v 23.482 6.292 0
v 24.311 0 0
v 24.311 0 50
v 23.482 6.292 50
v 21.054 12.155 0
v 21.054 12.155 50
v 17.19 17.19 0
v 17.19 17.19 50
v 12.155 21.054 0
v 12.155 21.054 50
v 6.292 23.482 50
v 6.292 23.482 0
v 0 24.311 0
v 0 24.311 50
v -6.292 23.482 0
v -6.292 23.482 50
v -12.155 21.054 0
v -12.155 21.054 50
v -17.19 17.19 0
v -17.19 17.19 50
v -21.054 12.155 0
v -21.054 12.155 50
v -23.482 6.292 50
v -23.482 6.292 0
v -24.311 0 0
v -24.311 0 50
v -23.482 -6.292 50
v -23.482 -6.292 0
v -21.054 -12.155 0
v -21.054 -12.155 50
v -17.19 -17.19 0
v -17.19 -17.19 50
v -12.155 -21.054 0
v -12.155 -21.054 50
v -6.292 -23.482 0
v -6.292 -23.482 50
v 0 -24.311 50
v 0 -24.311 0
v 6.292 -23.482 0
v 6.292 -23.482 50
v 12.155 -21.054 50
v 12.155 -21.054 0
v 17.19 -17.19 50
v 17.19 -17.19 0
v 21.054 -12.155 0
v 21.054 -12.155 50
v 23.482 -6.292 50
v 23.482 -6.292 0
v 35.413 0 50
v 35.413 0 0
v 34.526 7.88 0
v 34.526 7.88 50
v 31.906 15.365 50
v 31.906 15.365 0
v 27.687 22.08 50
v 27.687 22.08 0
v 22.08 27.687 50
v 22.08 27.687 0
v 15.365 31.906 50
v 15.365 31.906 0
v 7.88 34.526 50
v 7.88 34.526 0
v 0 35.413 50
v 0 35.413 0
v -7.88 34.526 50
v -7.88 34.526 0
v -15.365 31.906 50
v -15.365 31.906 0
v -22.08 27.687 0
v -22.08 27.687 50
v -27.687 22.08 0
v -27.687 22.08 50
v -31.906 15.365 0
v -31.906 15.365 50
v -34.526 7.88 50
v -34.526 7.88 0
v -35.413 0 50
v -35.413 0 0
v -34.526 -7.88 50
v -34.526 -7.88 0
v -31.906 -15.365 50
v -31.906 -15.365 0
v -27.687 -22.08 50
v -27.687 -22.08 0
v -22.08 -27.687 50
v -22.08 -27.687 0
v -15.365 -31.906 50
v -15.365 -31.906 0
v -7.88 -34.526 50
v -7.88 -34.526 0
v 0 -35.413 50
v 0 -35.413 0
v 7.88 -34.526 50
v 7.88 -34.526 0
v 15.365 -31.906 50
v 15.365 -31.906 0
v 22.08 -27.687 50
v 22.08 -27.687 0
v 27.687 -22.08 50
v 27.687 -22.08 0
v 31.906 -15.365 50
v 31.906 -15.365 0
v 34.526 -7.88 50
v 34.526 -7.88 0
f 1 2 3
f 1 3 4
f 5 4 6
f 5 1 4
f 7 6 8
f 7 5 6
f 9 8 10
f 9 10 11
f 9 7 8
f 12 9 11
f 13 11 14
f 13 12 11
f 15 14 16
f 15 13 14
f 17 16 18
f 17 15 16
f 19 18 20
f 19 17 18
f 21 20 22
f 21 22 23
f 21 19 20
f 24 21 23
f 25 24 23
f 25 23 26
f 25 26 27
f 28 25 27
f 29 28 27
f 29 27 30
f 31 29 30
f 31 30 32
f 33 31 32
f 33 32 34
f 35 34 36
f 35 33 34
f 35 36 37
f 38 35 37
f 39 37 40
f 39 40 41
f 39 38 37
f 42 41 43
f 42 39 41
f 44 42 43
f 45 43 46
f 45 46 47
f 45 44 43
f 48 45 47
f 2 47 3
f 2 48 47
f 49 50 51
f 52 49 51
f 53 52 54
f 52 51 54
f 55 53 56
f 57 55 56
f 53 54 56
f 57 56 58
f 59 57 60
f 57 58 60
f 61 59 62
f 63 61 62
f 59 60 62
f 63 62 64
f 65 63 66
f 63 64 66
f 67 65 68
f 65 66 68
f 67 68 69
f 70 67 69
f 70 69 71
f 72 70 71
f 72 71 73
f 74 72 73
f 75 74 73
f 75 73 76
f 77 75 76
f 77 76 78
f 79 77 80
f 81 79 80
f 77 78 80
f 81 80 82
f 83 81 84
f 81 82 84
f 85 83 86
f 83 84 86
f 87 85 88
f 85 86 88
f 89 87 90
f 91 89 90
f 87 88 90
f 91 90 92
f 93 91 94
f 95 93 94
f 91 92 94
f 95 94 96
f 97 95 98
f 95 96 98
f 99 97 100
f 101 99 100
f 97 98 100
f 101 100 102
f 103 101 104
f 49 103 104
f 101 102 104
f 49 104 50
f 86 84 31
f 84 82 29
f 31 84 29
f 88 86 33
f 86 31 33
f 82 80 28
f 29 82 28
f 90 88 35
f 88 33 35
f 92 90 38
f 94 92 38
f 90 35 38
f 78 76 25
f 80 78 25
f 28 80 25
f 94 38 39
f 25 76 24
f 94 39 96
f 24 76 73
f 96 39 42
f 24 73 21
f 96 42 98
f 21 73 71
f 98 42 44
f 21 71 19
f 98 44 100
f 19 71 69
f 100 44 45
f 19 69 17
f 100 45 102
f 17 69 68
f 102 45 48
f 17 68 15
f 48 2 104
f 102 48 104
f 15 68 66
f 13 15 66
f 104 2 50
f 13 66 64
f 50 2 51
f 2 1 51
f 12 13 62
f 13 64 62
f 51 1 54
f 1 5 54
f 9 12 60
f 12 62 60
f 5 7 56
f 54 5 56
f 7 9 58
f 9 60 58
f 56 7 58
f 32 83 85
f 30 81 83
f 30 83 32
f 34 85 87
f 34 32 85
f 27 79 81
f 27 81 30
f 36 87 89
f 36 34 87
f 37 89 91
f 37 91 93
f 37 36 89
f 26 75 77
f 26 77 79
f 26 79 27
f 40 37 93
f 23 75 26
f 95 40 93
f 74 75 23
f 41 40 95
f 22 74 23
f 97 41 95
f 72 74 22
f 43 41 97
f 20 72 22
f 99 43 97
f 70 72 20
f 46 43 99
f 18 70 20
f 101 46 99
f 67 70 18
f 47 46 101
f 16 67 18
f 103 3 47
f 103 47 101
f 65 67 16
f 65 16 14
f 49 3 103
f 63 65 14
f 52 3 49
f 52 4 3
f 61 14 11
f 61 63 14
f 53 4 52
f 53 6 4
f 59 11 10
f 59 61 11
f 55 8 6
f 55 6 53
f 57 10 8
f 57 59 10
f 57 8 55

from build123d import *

# Parameters (mm, degrees)
F0_R     = 35.413453
F1_DEPTH = 50
F2_R     = 30.967597
F3_DEPTH = 50
F4_R     = 30.405433
F5_DEPTH = 50
F6_R     = 24.310595
F7_DEPTH = 50


with BuildPart() as f1:
    # F0 (on Top) → F1 (new body)
    with BuildSketch(Plane.XY):
        Circle(F0_R)
    extrude(amount=F1_DEPTH)

    # F2 (on Top) → F3 (cut)
    with BuildSketch(Plane.XY):
        Circle(F2_R)
    extrude(amount=-F3_DEPTH, mode=Mode.SUBTRACT)

    # F4 (on Top) → F5 (cut)
    with BuildSketch(Plane.XY):
        Circle(F4_R)
    extrude(amount=-F5_DEPTH, mode=Mode.SUBTRACT)

    # F6 (on Top) → F7 (cut)
    with BuildSketch(Plane.XY):
        Circle(F6_R)
    extrude(amount=F7_DEPTH, mode=Mode.SUBTRACT)


solid = f1.part
